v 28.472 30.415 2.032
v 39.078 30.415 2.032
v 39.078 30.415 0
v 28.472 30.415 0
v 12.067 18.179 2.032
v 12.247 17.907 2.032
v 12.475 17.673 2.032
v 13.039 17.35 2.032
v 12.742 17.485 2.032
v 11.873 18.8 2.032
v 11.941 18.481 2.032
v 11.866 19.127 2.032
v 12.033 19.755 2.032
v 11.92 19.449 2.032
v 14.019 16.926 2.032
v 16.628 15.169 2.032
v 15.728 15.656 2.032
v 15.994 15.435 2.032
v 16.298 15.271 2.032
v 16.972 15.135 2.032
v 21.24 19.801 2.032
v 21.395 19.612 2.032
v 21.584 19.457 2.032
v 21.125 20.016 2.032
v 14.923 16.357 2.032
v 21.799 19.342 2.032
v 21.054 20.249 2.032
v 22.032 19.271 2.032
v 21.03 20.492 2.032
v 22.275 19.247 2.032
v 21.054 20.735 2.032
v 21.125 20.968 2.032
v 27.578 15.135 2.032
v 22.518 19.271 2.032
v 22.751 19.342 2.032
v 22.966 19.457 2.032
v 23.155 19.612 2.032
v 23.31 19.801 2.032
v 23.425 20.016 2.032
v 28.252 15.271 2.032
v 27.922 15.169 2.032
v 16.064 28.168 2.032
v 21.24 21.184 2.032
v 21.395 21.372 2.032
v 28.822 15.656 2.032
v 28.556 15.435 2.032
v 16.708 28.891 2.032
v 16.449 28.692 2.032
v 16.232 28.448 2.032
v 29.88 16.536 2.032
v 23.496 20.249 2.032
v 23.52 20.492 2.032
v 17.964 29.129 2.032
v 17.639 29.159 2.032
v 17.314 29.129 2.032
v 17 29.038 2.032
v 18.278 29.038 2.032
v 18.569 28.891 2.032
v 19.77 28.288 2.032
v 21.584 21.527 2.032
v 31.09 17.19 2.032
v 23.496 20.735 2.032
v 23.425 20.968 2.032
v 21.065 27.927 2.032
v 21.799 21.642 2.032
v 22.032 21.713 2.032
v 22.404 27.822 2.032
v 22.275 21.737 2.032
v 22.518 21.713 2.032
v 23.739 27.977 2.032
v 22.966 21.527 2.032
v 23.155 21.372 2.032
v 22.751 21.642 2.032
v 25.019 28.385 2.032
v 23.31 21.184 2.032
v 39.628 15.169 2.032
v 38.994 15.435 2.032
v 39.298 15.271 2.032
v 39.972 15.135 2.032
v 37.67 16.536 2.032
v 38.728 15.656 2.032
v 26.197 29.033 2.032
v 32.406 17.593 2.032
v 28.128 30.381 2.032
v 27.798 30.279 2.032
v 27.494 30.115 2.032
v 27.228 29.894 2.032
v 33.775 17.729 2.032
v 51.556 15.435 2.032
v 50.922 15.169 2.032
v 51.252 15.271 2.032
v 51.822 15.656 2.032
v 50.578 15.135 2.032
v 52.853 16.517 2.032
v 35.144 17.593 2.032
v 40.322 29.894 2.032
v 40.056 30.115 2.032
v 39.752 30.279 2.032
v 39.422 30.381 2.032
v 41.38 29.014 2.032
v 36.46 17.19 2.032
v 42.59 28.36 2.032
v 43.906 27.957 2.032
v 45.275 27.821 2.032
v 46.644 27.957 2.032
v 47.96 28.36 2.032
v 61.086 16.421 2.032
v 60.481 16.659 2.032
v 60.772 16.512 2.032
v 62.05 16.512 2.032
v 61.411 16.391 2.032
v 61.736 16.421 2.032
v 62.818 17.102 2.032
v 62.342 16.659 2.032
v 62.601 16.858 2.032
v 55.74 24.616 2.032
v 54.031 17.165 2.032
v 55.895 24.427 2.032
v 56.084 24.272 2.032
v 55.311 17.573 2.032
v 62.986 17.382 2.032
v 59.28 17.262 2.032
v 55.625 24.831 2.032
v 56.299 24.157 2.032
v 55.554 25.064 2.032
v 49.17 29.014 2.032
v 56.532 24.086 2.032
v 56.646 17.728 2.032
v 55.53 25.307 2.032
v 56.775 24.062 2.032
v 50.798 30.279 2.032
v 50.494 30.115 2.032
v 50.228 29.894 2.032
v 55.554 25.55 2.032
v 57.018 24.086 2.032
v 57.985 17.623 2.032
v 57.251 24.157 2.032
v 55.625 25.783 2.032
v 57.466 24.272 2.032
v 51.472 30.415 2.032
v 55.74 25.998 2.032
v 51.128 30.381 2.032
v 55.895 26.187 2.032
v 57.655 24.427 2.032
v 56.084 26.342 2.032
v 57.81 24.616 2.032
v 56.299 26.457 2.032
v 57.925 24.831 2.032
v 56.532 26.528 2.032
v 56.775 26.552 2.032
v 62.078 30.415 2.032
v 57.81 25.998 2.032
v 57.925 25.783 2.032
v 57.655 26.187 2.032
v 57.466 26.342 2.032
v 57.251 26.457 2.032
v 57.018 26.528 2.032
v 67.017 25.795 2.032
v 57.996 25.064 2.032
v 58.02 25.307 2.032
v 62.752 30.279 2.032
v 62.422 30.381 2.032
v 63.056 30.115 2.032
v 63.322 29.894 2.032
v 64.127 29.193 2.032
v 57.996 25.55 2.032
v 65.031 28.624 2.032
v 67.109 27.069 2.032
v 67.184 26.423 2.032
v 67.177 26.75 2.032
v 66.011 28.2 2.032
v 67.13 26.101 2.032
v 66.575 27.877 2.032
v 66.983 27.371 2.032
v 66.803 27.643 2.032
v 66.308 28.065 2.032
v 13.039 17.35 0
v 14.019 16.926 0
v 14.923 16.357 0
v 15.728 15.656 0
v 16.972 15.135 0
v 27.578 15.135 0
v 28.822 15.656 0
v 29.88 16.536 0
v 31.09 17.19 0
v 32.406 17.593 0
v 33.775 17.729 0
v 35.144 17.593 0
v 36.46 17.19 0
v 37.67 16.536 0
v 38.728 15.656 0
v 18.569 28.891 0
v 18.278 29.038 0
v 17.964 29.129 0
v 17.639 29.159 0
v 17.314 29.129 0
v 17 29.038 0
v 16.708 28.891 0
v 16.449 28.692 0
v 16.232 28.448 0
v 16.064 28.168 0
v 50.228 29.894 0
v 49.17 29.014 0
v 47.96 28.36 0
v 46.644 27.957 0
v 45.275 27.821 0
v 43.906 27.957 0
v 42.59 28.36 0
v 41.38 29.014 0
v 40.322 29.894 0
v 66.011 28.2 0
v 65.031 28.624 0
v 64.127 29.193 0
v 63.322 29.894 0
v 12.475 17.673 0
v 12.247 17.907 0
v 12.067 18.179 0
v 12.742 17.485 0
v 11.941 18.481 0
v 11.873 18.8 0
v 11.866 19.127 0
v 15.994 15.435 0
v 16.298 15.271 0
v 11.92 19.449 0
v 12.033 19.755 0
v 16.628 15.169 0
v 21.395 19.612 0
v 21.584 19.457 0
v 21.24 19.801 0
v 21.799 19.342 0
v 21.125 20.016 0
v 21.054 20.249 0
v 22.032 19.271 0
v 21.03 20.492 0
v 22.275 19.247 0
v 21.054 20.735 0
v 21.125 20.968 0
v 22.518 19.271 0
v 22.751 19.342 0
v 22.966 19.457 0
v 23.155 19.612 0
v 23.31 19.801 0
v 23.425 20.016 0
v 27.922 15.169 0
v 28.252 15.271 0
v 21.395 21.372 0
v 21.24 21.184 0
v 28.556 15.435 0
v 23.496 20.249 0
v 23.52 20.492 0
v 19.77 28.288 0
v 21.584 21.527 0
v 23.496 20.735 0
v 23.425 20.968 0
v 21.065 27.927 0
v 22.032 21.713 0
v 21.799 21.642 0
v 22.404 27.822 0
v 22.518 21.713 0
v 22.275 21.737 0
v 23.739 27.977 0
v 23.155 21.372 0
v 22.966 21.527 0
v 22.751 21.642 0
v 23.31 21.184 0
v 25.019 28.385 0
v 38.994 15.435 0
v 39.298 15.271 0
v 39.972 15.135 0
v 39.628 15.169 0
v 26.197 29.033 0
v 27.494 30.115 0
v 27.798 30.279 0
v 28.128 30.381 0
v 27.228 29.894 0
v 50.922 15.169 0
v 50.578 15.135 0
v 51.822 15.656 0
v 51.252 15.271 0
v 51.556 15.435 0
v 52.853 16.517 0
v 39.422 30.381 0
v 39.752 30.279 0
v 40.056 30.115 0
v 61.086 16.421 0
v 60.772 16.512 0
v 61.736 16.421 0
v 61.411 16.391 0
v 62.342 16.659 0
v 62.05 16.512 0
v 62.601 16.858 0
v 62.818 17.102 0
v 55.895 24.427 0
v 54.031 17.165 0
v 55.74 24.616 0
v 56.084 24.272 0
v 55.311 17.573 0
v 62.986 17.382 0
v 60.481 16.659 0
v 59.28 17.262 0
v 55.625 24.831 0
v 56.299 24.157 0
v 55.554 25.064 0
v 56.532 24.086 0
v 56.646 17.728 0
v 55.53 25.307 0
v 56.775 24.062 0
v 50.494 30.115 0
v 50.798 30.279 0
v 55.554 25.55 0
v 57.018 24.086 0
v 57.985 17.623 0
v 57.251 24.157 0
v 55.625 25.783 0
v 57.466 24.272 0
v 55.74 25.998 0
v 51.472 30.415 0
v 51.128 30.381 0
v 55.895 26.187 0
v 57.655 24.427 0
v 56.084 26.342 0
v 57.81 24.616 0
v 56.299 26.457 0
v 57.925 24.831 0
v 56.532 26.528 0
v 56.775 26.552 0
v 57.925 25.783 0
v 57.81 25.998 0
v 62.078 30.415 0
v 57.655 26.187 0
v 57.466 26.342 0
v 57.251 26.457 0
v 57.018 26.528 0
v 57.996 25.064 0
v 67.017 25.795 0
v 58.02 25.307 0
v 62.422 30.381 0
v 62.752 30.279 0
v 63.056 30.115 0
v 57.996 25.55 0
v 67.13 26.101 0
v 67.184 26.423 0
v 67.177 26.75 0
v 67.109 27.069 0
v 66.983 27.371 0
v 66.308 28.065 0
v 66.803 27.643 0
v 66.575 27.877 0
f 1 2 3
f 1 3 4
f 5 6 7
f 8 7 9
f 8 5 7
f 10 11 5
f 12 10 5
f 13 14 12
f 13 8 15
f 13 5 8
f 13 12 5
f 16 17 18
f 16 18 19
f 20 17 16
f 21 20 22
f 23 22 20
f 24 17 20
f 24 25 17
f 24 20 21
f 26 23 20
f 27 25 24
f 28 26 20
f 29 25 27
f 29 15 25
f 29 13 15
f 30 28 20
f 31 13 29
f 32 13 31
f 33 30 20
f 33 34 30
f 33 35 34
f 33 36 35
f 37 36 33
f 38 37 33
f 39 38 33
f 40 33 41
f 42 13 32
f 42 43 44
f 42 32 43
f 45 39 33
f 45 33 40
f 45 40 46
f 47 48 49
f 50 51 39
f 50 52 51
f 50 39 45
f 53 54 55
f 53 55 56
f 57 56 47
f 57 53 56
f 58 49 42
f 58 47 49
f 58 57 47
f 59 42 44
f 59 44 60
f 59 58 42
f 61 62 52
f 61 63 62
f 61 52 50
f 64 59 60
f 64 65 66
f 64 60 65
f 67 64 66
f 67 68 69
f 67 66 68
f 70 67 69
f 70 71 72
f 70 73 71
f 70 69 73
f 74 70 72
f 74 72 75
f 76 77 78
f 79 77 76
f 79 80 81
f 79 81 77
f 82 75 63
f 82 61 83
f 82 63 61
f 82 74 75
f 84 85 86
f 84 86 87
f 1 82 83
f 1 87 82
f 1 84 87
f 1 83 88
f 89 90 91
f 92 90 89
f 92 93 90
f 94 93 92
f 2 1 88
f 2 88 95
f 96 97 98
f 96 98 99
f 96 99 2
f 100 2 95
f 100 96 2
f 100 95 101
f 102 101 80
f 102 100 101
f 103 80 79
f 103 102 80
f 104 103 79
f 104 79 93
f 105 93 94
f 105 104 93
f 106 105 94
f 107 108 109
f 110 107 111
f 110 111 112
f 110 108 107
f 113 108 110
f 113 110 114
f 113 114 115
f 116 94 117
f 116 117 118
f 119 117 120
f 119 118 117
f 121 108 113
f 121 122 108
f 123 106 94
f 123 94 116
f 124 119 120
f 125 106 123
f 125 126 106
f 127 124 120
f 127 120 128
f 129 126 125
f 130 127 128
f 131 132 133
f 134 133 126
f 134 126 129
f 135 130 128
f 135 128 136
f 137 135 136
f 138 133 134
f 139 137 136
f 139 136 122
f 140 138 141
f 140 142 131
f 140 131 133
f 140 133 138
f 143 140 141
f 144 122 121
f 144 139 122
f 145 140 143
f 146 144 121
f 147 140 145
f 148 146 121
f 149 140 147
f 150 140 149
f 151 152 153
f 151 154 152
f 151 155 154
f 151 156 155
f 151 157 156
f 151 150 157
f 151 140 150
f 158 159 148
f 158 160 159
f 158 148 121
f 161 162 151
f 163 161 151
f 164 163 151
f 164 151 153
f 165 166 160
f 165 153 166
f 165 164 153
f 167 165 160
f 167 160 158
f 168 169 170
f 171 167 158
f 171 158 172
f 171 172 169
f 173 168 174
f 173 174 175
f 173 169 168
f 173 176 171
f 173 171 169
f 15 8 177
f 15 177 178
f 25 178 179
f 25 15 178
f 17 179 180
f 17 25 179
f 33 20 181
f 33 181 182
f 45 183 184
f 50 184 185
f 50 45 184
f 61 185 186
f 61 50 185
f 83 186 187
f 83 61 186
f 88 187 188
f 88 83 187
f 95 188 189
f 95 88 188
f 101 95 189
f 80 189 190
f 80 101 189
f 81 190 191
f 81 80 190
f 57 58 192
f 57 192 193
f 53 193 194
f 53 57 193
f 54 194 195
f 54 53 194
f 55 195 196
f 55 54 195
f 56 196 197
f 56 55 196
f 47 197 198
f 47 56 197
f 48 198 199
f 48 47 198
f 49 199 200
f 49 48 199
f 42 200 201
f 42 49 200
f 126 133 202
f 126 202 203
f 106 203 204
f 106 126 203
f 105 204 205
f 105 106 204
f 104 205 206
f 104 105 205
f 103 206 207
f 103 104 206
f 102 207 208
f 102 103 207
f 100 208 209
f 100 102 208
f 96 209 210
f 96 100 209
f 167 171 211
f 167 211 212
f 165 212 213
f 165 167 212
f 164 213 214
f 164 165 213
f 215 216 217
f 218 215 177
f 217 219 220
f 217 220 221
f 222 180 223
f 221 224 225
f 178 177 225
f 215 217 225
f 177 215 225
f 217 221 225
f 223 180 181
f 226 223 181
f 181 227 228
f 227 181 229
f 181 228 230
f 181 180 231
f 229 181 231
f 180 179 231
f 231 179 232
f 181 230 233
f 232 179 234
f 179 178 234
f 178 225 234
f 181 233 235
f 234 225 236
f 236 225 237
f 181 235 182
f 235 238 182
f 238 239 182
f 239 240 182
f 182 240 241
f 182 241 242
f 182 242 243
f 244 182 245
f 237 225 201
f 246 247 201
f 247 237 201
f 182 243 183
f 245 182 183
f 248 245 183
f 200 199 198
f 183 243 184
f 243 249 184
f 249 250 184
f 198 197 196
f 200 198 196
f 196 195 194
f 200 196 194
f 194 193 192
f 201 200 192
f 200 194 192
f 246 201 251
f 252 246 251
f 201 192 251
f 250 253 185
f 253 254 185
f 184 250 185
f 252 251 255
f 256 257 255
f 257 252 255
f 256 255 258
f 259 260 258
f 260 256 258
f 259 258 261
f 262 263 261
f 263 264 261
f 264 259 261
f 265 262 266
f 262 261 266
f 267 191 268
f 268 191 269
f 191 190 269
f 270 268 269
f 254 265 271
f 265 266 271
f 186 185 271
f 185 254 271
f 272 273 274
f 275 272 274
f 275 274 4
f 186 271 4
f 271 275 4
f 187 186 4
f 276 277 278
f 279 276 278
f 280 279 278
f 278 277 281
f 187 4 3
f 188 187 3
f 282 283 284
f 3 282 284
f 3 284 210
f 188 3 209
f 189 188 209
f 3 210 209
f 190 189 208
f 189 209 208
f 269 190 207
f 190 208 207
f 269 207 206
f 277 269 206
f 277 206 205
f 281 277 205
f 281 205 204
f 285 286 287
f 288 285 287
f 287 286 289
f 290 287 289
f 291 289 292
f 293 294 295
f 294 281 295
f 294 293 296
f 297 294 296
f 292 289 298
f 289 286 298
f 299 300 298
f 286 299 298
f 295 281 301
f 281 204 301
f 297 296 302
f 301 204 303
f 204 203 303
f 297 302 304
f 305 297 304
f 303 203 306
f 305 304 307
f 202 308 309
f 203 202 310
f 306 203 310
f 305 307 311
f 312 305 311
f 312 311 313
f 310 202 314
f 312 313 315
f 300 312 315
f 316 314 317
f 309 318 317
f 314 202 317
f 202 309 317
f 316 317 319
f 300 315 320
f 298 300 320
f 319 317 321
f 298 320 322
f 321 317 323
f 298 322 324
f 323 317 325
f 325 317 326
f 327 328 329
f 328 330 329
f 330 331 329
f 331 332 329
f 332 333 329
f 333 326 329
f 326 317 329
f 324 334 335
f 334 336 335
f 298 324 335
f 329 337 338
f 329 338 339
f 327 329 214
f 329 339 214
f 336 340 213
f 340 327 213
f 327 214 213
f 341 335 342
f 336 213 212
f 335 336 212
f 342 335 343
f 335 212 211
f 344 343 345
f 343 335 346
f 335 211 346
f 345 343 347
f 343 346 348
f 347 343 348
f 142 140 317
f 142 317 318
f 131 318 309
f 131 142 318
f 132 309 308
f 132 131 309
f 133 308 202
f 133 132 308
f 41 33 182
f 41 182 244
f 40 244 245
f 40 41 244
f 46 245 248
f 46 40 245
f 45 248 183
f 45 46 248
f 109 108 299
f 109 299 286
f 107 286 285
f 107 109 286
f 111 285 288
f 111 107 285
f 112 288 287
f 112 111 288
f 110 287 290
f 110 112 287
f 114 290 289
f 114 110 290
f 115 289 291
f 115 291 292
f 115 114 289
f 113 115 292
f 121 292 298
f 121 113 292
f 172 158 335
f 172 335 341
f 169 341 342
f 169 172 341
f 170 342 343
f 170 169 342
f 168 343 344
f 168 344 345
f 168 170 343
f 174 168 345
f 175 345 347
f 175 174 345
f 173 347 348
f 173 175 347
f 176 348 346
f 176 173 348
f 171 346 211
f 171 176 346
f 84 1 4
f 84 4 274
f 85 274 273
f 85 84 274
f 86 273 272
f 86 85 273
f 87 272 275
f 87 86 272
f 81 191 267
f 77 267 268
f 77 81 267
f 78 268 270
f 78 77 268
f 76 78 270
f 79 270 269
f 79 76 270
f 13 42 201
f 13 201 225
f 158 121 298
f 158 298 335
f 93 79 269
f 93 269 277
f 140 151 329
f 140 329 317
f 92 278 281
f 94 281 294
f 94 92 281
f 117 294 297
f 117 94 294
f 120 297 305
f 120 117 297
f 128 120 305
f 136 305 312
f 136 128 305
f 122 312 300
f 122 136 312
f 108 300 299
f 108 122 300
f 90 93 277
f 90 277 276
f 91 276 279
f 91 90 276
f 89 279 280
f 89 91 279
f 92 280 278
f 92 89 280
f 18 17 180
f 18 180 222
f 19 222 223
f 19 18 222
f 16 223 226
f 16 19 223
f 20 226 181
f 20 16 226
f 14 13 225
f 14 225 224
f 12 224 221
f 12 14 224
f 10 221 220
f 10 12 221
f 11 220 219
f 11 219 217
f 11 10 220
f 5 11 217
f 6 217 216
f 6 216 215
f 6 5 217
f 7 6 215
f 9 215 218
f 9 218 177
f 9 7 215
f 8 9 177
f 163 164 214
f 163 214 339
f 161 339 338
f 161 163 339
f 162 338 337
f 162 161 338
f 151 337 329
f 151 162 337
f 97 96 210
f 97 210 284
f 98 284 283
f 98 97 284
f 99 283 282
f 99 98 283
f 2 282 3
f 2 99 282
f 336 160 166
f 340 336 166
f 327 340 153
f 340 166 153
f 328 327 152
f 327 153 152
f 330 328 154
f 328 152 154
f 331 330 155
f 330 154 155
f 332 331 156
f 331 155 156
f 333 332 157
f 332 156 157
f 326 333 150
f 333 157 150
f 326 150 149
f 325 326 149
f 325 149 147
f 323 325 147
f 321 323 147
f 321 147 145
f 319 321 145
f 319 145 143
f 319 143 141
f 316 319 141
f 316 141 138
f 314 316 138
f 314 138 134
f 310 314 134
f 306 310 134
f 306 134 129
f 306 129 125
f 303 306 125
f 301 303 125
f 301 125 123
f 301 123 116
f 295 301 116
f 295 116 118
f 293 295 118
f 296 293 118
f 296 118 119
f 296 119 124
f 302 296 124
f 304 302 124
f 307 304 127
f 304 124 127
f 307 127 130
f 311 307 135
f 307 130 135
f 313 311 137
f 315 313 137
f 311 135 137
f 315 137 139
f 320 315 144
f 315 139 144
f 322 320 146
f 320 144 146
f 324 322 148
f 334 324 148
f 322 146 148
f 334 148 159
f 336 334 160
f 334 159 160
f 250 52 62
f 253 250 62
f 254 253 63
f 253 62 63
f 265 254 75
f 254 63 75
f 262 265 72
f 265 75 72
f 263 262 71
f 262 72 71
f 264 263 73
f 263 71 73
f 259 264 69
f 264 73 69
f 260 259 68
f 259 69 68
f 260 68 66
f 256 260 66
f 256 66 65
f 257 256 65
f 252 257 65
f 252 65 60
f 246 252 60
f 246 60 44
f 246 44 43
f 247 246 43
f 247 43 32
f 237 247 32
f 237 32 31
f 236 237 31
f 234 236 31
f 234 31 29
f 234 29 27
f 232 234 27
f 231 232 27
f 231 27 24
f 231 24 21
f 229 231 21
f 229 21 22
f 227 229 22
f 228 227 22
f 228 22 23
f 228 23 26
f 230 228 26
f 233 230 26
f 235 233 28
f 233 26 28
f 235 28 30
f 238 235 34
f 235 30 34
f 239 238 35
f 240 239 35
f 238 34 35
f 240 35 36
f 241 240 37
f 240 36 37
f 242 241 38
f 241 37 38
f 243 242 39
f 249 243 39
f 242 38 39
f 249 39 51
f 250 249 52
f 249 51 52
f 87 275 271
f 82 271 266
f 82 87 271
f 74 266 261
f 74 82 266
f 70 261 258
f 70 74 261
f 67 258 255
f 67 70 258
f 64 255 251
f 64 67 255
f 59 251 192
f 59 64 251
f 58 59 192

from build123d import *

# Parameters (mm, degrees)
BOSS_EXTRUDE1_DEPTH = 2.032
FILLET1_R           = 2
SKETCH4_R           = 1.2446
CUT_EXTRUDE1_DEPTH  = 75.115872934
CUT_EXTRUDE2_DEPTH  = 75.115872934


with BuildPart() as part:
    # Sketch3 → Boss-Extrude1 (new body)
    with BuildSketch(Plane.XY):
        with BuildLine():
            Line((62.980794963, 30.66873734), (50.569205037, 30.66873734))
            ThreePointArc((50.569205037, 30.66873734), (45.275, 28.075), (39.980794963, 30.66873734))
            Line((39.980794963, 30.66873734), (27.569205037, 30.66873734))
            ThreePointArc((27.569205037, 30.66873734), (22.275, 28.075), (16.980794963, 30.66873734))
            Line((16.980794963, 30.66873734), (10.658308864, 17.473983742))
            ThreePointArc((10.658308864, 17.473983742), (13.670205209, 16.817167392), (16.069205037, 14.88126266))
            Line((16.069205037, 14.88126266), (28.480794963, 14.88126266))
            ThreePointArc((28.480794963, 14.88126266), (33.775, 17.475), (39.069205037, 14.88126266))
            Line((39.069205037, 14.88126266), (51.480794963, 14.88126266))
            ThreePointArc((51.480794963, 14.88126266), (56.775, 17.475), (62.069205037, 14.88126266))
            Line((62.069205037, 14.88126266), (68.391691136, 28.076016258))
            ThreePointArc((68.391691136, 28.076016258), (65.379794791, 28.732832608), (62.980794963, 30.66873734))
        make_face()
    extrude(amount=BOSS_EXTRUDE1_DEPTH)

    # Fillet1
    fillet1_edges = [part.edges().sort_by_distance(p)[0] for p in [
        (68.391691136, 28.076016258, 1.016),
        (62.069205037, 14.88126266, 1.016),
        (51.480794963, 14.88126266, 1.016),
        (39.069205037, 14.88126266, 1.016),
        (28.480794963, 14.88126266, 1.016),
        (16.069205037, 14.88126266, 1.016),
        (10.658308864, 17.473983742, 1.016),
        (16.980794963, 30.66873734, 1.016),
        (27.569205037, 30.66873734, 1.016),
        (39.980794963, 30.66873734, 1.016),
        (50.569205037, 30.66873734, 1.016),
        (62.980794963, 30.66873734, 1.016),
    ]]
    fillet(fillet1_edges, radius=FILLET1_R)

    # Sketch4 → Cut-Extrude1 (cut, through all)
    with BuildSketch(Plane.XY.offset(2.032)):
        with Locations((22.275, 20.49206771)):
            Circle(SKETCH4_R)
        with Locations((56.775, 25.307013878)):
            Circle(SKETCH4_R)
    extrude(amount=-CUT_EXTRUDE1_DEPTH, mode=Mode.SUBTRACT)

    # Sketch6 → Cut-Extrude2 (cut, through all)
    with BuildSketch(Plane.XY.offset(2.032)):
        with BuildLine():
            Line((62.077939702, 30.66873734), (51.472060298, 30.66873734))
            ThreePointArc((51.472060298, 30.66873734), (50.699880618, 30.513659708), (50.047448735, 30.072475883))
            ThreePointArc((50.047448735, 30.072475883), (45.275, 28.075), (40.502551265, 30.072475883))
            ThreePointArc((40.502551265, 30.072475883), (39.850119382, 30.513659708), (39.077939702, 30.66873734))
            Line((39.077939702, 30.66873734), (28.472060298, 30.66873734))
            ThreePointArc((28.472060298, 30.66873734), (27.699880618, 30.513659708), (27.047448735, 30.072475883))
            ThreePointArc((27.047448735, 30.072475883), (23.046259875, 28.119539219), (18.704481797, 29.105661435))
            ThreePointArc((18.704481797, 29.105661435), (17.084104729, 29.334902549), (15.835023411, 28.277561926))
            Line((15.835023411, 28.277561926), (11.804080417, 19.865159157))
            ThreePointArc((11.804080417, 19.865159157), (11.762608918, 18.229172162), (12.956514205, 17.109902981))
            ThreePointArc((12.956514205, 17.109902981), (14.346493431, 16.443724254), (15.547448735, 15.477524117))
            ThreePointArc((15.547448735, 15.477524117), (16.199880618, 15.036340292), (16.972060298, 14.88126266))
            Line((16.972060298, 14.88126266), (27.577939702, 14.88126266))
            ThreePointArc((27.577939702, 14.88126266), (28.350119382, 15.036340292), (29.002551265, 15.477524117))
            ThreePointArc((29.002551265, 15.477524117), (33.775, 17.475), (38.547448735, 15.477524117))
            ThreePointArc((38.547448735, 15.477524117), (39.199880618, 15.036340292), (39.972060298, 14.88126266))
            Line((39.972060298, 14.88126266), (50.577939702, 14.88126266))
            ThreePointArc((50.577939702, 14.88126266), (51.350119382, 15.036340292), (52.002551265, 15.477524117))
            ThreePointArc((52.002551265, 15.477524117), (56.003740125, 17.430460781), (60.345518203, 16.444338565))
            ThreePointArc((60.345518203, 16.444338565), (61.965895271, 16.215097451), (63.214976589, 17.272438074))
            Line((63.214976589, 17.272438074), (67.245919583, 25.684840843))
            ThreePointArc((67.245919583, 25.684840843), (67.287391082, 27.320827838), (66.093485795, 28.440097019))
            ThreePointArc((66.093485795, 28.440097019), (64.703506569, 29.106275746), (63.502551265, 30.072475883))
            ThreePointArc((63.502551265, 30.072475883), (62.850119382, 30.513659708), (62.077939702, 30.66873734))
        make_face()
        with BuildLine():
            Line((16.064084682, 28.1678034), (12.033141688, 19.755400631))
            ThreePointArc((12.033141688, 19.755400631), (11.99693707, 18.327183984), (13.039216385, 17.350061989))
            ThreePointArc((13.039216385, 17.350061989), (14.481890346, 16.658628129), (15.728374403, 15.655798912))
            ThreePointArc((15.728374403, 15.655798912), (16.297947437, 15.270645433), (16.972060298, 15.13526266))
            Line((16.972060298, 15.13526266), (27.577939702, 15.13526266))
            ThreePointArc((27.577939702, 15.13526266), (28.252052563, 15.270645433), (28.821625597, 15.655798912))
            ThreePointArc((28.821625597, 15.655798912), (33.775, 17.729), (38.728374403, 15.655798912))
            ThreePointArc((38.728374403, 15.655798912), (39.297947437, 15.270645433), (39.972060298, 15.13526266))
            Line((39.972060298, 15.13526266), (50.577939702, 15.13526266))
            ThreePointArc((50.577939702, 15.13526266), (51.252052563, 15.270645433), (51.821625597, 15.655798912))
            ThreePointArc((51.821625597, 15.655798912), (55.974501318, 17.682772279), (60.480878147, 16.659265728))
            ThreePointArc((60.480878147, 16.659265728), (61.895467327, 16.459138236), (62.985915318, 17.3821966))
            Line((62.985915318, 17.3821966), (67.016858312, 25.794599369))
            ThreePointArc((67.016858312, 25.794599369), (67.05306293, 27.222816016), (66.010783615, 28.199938011))
            ThreePointArc((66.010783615, 28.199938011), (64.568109654, 28.891371871), (63.321625597, 29.894201088))
            ThreePointArc((63.321625597, 29.894201088), (62.752052563, 30.279354567), (62.077939702, 30.41473734))
            Line((62.077939702, 30.41473734), (51.472060298, 30.41473734))
            ThreePointArc((51.472060298, 30.41473734), (50.797947437, 30.279354567), (50.228374403, 29.894201088))
            ThreePointArc((50.228374403, 29.894201088), (45.275, 27.821), (40.321625597, 29.894201088))
            ThreePointArc((40.321625597, 29.894201088), (39.752052563, 30.279354567), (39.077939702, 30.41473734))
            Line((39.077939702, 30.41473734), (28.472060298, 30.41473734))
            ThreePointArc((28.472060298, 30.41473734), (27.797947437, 30.279354567), (27.228374403, 29.894201088))
            ThreePointArc((27.228374403, 29.894201088), (23.075498682, 27.867227721), (18.569121853, 28.890734272))
            ThreePointArc((18.569121853, 28.890734272), (17.154532673, 29.090861764), (16.064084682, 28.1678034))
        make_face(mode=Mode.SUBTRACT)
    extrude(amount=-CUT_EXTRUDE2_DEPTH, mode=Mode.SUBTRACT)


solid = part.part
